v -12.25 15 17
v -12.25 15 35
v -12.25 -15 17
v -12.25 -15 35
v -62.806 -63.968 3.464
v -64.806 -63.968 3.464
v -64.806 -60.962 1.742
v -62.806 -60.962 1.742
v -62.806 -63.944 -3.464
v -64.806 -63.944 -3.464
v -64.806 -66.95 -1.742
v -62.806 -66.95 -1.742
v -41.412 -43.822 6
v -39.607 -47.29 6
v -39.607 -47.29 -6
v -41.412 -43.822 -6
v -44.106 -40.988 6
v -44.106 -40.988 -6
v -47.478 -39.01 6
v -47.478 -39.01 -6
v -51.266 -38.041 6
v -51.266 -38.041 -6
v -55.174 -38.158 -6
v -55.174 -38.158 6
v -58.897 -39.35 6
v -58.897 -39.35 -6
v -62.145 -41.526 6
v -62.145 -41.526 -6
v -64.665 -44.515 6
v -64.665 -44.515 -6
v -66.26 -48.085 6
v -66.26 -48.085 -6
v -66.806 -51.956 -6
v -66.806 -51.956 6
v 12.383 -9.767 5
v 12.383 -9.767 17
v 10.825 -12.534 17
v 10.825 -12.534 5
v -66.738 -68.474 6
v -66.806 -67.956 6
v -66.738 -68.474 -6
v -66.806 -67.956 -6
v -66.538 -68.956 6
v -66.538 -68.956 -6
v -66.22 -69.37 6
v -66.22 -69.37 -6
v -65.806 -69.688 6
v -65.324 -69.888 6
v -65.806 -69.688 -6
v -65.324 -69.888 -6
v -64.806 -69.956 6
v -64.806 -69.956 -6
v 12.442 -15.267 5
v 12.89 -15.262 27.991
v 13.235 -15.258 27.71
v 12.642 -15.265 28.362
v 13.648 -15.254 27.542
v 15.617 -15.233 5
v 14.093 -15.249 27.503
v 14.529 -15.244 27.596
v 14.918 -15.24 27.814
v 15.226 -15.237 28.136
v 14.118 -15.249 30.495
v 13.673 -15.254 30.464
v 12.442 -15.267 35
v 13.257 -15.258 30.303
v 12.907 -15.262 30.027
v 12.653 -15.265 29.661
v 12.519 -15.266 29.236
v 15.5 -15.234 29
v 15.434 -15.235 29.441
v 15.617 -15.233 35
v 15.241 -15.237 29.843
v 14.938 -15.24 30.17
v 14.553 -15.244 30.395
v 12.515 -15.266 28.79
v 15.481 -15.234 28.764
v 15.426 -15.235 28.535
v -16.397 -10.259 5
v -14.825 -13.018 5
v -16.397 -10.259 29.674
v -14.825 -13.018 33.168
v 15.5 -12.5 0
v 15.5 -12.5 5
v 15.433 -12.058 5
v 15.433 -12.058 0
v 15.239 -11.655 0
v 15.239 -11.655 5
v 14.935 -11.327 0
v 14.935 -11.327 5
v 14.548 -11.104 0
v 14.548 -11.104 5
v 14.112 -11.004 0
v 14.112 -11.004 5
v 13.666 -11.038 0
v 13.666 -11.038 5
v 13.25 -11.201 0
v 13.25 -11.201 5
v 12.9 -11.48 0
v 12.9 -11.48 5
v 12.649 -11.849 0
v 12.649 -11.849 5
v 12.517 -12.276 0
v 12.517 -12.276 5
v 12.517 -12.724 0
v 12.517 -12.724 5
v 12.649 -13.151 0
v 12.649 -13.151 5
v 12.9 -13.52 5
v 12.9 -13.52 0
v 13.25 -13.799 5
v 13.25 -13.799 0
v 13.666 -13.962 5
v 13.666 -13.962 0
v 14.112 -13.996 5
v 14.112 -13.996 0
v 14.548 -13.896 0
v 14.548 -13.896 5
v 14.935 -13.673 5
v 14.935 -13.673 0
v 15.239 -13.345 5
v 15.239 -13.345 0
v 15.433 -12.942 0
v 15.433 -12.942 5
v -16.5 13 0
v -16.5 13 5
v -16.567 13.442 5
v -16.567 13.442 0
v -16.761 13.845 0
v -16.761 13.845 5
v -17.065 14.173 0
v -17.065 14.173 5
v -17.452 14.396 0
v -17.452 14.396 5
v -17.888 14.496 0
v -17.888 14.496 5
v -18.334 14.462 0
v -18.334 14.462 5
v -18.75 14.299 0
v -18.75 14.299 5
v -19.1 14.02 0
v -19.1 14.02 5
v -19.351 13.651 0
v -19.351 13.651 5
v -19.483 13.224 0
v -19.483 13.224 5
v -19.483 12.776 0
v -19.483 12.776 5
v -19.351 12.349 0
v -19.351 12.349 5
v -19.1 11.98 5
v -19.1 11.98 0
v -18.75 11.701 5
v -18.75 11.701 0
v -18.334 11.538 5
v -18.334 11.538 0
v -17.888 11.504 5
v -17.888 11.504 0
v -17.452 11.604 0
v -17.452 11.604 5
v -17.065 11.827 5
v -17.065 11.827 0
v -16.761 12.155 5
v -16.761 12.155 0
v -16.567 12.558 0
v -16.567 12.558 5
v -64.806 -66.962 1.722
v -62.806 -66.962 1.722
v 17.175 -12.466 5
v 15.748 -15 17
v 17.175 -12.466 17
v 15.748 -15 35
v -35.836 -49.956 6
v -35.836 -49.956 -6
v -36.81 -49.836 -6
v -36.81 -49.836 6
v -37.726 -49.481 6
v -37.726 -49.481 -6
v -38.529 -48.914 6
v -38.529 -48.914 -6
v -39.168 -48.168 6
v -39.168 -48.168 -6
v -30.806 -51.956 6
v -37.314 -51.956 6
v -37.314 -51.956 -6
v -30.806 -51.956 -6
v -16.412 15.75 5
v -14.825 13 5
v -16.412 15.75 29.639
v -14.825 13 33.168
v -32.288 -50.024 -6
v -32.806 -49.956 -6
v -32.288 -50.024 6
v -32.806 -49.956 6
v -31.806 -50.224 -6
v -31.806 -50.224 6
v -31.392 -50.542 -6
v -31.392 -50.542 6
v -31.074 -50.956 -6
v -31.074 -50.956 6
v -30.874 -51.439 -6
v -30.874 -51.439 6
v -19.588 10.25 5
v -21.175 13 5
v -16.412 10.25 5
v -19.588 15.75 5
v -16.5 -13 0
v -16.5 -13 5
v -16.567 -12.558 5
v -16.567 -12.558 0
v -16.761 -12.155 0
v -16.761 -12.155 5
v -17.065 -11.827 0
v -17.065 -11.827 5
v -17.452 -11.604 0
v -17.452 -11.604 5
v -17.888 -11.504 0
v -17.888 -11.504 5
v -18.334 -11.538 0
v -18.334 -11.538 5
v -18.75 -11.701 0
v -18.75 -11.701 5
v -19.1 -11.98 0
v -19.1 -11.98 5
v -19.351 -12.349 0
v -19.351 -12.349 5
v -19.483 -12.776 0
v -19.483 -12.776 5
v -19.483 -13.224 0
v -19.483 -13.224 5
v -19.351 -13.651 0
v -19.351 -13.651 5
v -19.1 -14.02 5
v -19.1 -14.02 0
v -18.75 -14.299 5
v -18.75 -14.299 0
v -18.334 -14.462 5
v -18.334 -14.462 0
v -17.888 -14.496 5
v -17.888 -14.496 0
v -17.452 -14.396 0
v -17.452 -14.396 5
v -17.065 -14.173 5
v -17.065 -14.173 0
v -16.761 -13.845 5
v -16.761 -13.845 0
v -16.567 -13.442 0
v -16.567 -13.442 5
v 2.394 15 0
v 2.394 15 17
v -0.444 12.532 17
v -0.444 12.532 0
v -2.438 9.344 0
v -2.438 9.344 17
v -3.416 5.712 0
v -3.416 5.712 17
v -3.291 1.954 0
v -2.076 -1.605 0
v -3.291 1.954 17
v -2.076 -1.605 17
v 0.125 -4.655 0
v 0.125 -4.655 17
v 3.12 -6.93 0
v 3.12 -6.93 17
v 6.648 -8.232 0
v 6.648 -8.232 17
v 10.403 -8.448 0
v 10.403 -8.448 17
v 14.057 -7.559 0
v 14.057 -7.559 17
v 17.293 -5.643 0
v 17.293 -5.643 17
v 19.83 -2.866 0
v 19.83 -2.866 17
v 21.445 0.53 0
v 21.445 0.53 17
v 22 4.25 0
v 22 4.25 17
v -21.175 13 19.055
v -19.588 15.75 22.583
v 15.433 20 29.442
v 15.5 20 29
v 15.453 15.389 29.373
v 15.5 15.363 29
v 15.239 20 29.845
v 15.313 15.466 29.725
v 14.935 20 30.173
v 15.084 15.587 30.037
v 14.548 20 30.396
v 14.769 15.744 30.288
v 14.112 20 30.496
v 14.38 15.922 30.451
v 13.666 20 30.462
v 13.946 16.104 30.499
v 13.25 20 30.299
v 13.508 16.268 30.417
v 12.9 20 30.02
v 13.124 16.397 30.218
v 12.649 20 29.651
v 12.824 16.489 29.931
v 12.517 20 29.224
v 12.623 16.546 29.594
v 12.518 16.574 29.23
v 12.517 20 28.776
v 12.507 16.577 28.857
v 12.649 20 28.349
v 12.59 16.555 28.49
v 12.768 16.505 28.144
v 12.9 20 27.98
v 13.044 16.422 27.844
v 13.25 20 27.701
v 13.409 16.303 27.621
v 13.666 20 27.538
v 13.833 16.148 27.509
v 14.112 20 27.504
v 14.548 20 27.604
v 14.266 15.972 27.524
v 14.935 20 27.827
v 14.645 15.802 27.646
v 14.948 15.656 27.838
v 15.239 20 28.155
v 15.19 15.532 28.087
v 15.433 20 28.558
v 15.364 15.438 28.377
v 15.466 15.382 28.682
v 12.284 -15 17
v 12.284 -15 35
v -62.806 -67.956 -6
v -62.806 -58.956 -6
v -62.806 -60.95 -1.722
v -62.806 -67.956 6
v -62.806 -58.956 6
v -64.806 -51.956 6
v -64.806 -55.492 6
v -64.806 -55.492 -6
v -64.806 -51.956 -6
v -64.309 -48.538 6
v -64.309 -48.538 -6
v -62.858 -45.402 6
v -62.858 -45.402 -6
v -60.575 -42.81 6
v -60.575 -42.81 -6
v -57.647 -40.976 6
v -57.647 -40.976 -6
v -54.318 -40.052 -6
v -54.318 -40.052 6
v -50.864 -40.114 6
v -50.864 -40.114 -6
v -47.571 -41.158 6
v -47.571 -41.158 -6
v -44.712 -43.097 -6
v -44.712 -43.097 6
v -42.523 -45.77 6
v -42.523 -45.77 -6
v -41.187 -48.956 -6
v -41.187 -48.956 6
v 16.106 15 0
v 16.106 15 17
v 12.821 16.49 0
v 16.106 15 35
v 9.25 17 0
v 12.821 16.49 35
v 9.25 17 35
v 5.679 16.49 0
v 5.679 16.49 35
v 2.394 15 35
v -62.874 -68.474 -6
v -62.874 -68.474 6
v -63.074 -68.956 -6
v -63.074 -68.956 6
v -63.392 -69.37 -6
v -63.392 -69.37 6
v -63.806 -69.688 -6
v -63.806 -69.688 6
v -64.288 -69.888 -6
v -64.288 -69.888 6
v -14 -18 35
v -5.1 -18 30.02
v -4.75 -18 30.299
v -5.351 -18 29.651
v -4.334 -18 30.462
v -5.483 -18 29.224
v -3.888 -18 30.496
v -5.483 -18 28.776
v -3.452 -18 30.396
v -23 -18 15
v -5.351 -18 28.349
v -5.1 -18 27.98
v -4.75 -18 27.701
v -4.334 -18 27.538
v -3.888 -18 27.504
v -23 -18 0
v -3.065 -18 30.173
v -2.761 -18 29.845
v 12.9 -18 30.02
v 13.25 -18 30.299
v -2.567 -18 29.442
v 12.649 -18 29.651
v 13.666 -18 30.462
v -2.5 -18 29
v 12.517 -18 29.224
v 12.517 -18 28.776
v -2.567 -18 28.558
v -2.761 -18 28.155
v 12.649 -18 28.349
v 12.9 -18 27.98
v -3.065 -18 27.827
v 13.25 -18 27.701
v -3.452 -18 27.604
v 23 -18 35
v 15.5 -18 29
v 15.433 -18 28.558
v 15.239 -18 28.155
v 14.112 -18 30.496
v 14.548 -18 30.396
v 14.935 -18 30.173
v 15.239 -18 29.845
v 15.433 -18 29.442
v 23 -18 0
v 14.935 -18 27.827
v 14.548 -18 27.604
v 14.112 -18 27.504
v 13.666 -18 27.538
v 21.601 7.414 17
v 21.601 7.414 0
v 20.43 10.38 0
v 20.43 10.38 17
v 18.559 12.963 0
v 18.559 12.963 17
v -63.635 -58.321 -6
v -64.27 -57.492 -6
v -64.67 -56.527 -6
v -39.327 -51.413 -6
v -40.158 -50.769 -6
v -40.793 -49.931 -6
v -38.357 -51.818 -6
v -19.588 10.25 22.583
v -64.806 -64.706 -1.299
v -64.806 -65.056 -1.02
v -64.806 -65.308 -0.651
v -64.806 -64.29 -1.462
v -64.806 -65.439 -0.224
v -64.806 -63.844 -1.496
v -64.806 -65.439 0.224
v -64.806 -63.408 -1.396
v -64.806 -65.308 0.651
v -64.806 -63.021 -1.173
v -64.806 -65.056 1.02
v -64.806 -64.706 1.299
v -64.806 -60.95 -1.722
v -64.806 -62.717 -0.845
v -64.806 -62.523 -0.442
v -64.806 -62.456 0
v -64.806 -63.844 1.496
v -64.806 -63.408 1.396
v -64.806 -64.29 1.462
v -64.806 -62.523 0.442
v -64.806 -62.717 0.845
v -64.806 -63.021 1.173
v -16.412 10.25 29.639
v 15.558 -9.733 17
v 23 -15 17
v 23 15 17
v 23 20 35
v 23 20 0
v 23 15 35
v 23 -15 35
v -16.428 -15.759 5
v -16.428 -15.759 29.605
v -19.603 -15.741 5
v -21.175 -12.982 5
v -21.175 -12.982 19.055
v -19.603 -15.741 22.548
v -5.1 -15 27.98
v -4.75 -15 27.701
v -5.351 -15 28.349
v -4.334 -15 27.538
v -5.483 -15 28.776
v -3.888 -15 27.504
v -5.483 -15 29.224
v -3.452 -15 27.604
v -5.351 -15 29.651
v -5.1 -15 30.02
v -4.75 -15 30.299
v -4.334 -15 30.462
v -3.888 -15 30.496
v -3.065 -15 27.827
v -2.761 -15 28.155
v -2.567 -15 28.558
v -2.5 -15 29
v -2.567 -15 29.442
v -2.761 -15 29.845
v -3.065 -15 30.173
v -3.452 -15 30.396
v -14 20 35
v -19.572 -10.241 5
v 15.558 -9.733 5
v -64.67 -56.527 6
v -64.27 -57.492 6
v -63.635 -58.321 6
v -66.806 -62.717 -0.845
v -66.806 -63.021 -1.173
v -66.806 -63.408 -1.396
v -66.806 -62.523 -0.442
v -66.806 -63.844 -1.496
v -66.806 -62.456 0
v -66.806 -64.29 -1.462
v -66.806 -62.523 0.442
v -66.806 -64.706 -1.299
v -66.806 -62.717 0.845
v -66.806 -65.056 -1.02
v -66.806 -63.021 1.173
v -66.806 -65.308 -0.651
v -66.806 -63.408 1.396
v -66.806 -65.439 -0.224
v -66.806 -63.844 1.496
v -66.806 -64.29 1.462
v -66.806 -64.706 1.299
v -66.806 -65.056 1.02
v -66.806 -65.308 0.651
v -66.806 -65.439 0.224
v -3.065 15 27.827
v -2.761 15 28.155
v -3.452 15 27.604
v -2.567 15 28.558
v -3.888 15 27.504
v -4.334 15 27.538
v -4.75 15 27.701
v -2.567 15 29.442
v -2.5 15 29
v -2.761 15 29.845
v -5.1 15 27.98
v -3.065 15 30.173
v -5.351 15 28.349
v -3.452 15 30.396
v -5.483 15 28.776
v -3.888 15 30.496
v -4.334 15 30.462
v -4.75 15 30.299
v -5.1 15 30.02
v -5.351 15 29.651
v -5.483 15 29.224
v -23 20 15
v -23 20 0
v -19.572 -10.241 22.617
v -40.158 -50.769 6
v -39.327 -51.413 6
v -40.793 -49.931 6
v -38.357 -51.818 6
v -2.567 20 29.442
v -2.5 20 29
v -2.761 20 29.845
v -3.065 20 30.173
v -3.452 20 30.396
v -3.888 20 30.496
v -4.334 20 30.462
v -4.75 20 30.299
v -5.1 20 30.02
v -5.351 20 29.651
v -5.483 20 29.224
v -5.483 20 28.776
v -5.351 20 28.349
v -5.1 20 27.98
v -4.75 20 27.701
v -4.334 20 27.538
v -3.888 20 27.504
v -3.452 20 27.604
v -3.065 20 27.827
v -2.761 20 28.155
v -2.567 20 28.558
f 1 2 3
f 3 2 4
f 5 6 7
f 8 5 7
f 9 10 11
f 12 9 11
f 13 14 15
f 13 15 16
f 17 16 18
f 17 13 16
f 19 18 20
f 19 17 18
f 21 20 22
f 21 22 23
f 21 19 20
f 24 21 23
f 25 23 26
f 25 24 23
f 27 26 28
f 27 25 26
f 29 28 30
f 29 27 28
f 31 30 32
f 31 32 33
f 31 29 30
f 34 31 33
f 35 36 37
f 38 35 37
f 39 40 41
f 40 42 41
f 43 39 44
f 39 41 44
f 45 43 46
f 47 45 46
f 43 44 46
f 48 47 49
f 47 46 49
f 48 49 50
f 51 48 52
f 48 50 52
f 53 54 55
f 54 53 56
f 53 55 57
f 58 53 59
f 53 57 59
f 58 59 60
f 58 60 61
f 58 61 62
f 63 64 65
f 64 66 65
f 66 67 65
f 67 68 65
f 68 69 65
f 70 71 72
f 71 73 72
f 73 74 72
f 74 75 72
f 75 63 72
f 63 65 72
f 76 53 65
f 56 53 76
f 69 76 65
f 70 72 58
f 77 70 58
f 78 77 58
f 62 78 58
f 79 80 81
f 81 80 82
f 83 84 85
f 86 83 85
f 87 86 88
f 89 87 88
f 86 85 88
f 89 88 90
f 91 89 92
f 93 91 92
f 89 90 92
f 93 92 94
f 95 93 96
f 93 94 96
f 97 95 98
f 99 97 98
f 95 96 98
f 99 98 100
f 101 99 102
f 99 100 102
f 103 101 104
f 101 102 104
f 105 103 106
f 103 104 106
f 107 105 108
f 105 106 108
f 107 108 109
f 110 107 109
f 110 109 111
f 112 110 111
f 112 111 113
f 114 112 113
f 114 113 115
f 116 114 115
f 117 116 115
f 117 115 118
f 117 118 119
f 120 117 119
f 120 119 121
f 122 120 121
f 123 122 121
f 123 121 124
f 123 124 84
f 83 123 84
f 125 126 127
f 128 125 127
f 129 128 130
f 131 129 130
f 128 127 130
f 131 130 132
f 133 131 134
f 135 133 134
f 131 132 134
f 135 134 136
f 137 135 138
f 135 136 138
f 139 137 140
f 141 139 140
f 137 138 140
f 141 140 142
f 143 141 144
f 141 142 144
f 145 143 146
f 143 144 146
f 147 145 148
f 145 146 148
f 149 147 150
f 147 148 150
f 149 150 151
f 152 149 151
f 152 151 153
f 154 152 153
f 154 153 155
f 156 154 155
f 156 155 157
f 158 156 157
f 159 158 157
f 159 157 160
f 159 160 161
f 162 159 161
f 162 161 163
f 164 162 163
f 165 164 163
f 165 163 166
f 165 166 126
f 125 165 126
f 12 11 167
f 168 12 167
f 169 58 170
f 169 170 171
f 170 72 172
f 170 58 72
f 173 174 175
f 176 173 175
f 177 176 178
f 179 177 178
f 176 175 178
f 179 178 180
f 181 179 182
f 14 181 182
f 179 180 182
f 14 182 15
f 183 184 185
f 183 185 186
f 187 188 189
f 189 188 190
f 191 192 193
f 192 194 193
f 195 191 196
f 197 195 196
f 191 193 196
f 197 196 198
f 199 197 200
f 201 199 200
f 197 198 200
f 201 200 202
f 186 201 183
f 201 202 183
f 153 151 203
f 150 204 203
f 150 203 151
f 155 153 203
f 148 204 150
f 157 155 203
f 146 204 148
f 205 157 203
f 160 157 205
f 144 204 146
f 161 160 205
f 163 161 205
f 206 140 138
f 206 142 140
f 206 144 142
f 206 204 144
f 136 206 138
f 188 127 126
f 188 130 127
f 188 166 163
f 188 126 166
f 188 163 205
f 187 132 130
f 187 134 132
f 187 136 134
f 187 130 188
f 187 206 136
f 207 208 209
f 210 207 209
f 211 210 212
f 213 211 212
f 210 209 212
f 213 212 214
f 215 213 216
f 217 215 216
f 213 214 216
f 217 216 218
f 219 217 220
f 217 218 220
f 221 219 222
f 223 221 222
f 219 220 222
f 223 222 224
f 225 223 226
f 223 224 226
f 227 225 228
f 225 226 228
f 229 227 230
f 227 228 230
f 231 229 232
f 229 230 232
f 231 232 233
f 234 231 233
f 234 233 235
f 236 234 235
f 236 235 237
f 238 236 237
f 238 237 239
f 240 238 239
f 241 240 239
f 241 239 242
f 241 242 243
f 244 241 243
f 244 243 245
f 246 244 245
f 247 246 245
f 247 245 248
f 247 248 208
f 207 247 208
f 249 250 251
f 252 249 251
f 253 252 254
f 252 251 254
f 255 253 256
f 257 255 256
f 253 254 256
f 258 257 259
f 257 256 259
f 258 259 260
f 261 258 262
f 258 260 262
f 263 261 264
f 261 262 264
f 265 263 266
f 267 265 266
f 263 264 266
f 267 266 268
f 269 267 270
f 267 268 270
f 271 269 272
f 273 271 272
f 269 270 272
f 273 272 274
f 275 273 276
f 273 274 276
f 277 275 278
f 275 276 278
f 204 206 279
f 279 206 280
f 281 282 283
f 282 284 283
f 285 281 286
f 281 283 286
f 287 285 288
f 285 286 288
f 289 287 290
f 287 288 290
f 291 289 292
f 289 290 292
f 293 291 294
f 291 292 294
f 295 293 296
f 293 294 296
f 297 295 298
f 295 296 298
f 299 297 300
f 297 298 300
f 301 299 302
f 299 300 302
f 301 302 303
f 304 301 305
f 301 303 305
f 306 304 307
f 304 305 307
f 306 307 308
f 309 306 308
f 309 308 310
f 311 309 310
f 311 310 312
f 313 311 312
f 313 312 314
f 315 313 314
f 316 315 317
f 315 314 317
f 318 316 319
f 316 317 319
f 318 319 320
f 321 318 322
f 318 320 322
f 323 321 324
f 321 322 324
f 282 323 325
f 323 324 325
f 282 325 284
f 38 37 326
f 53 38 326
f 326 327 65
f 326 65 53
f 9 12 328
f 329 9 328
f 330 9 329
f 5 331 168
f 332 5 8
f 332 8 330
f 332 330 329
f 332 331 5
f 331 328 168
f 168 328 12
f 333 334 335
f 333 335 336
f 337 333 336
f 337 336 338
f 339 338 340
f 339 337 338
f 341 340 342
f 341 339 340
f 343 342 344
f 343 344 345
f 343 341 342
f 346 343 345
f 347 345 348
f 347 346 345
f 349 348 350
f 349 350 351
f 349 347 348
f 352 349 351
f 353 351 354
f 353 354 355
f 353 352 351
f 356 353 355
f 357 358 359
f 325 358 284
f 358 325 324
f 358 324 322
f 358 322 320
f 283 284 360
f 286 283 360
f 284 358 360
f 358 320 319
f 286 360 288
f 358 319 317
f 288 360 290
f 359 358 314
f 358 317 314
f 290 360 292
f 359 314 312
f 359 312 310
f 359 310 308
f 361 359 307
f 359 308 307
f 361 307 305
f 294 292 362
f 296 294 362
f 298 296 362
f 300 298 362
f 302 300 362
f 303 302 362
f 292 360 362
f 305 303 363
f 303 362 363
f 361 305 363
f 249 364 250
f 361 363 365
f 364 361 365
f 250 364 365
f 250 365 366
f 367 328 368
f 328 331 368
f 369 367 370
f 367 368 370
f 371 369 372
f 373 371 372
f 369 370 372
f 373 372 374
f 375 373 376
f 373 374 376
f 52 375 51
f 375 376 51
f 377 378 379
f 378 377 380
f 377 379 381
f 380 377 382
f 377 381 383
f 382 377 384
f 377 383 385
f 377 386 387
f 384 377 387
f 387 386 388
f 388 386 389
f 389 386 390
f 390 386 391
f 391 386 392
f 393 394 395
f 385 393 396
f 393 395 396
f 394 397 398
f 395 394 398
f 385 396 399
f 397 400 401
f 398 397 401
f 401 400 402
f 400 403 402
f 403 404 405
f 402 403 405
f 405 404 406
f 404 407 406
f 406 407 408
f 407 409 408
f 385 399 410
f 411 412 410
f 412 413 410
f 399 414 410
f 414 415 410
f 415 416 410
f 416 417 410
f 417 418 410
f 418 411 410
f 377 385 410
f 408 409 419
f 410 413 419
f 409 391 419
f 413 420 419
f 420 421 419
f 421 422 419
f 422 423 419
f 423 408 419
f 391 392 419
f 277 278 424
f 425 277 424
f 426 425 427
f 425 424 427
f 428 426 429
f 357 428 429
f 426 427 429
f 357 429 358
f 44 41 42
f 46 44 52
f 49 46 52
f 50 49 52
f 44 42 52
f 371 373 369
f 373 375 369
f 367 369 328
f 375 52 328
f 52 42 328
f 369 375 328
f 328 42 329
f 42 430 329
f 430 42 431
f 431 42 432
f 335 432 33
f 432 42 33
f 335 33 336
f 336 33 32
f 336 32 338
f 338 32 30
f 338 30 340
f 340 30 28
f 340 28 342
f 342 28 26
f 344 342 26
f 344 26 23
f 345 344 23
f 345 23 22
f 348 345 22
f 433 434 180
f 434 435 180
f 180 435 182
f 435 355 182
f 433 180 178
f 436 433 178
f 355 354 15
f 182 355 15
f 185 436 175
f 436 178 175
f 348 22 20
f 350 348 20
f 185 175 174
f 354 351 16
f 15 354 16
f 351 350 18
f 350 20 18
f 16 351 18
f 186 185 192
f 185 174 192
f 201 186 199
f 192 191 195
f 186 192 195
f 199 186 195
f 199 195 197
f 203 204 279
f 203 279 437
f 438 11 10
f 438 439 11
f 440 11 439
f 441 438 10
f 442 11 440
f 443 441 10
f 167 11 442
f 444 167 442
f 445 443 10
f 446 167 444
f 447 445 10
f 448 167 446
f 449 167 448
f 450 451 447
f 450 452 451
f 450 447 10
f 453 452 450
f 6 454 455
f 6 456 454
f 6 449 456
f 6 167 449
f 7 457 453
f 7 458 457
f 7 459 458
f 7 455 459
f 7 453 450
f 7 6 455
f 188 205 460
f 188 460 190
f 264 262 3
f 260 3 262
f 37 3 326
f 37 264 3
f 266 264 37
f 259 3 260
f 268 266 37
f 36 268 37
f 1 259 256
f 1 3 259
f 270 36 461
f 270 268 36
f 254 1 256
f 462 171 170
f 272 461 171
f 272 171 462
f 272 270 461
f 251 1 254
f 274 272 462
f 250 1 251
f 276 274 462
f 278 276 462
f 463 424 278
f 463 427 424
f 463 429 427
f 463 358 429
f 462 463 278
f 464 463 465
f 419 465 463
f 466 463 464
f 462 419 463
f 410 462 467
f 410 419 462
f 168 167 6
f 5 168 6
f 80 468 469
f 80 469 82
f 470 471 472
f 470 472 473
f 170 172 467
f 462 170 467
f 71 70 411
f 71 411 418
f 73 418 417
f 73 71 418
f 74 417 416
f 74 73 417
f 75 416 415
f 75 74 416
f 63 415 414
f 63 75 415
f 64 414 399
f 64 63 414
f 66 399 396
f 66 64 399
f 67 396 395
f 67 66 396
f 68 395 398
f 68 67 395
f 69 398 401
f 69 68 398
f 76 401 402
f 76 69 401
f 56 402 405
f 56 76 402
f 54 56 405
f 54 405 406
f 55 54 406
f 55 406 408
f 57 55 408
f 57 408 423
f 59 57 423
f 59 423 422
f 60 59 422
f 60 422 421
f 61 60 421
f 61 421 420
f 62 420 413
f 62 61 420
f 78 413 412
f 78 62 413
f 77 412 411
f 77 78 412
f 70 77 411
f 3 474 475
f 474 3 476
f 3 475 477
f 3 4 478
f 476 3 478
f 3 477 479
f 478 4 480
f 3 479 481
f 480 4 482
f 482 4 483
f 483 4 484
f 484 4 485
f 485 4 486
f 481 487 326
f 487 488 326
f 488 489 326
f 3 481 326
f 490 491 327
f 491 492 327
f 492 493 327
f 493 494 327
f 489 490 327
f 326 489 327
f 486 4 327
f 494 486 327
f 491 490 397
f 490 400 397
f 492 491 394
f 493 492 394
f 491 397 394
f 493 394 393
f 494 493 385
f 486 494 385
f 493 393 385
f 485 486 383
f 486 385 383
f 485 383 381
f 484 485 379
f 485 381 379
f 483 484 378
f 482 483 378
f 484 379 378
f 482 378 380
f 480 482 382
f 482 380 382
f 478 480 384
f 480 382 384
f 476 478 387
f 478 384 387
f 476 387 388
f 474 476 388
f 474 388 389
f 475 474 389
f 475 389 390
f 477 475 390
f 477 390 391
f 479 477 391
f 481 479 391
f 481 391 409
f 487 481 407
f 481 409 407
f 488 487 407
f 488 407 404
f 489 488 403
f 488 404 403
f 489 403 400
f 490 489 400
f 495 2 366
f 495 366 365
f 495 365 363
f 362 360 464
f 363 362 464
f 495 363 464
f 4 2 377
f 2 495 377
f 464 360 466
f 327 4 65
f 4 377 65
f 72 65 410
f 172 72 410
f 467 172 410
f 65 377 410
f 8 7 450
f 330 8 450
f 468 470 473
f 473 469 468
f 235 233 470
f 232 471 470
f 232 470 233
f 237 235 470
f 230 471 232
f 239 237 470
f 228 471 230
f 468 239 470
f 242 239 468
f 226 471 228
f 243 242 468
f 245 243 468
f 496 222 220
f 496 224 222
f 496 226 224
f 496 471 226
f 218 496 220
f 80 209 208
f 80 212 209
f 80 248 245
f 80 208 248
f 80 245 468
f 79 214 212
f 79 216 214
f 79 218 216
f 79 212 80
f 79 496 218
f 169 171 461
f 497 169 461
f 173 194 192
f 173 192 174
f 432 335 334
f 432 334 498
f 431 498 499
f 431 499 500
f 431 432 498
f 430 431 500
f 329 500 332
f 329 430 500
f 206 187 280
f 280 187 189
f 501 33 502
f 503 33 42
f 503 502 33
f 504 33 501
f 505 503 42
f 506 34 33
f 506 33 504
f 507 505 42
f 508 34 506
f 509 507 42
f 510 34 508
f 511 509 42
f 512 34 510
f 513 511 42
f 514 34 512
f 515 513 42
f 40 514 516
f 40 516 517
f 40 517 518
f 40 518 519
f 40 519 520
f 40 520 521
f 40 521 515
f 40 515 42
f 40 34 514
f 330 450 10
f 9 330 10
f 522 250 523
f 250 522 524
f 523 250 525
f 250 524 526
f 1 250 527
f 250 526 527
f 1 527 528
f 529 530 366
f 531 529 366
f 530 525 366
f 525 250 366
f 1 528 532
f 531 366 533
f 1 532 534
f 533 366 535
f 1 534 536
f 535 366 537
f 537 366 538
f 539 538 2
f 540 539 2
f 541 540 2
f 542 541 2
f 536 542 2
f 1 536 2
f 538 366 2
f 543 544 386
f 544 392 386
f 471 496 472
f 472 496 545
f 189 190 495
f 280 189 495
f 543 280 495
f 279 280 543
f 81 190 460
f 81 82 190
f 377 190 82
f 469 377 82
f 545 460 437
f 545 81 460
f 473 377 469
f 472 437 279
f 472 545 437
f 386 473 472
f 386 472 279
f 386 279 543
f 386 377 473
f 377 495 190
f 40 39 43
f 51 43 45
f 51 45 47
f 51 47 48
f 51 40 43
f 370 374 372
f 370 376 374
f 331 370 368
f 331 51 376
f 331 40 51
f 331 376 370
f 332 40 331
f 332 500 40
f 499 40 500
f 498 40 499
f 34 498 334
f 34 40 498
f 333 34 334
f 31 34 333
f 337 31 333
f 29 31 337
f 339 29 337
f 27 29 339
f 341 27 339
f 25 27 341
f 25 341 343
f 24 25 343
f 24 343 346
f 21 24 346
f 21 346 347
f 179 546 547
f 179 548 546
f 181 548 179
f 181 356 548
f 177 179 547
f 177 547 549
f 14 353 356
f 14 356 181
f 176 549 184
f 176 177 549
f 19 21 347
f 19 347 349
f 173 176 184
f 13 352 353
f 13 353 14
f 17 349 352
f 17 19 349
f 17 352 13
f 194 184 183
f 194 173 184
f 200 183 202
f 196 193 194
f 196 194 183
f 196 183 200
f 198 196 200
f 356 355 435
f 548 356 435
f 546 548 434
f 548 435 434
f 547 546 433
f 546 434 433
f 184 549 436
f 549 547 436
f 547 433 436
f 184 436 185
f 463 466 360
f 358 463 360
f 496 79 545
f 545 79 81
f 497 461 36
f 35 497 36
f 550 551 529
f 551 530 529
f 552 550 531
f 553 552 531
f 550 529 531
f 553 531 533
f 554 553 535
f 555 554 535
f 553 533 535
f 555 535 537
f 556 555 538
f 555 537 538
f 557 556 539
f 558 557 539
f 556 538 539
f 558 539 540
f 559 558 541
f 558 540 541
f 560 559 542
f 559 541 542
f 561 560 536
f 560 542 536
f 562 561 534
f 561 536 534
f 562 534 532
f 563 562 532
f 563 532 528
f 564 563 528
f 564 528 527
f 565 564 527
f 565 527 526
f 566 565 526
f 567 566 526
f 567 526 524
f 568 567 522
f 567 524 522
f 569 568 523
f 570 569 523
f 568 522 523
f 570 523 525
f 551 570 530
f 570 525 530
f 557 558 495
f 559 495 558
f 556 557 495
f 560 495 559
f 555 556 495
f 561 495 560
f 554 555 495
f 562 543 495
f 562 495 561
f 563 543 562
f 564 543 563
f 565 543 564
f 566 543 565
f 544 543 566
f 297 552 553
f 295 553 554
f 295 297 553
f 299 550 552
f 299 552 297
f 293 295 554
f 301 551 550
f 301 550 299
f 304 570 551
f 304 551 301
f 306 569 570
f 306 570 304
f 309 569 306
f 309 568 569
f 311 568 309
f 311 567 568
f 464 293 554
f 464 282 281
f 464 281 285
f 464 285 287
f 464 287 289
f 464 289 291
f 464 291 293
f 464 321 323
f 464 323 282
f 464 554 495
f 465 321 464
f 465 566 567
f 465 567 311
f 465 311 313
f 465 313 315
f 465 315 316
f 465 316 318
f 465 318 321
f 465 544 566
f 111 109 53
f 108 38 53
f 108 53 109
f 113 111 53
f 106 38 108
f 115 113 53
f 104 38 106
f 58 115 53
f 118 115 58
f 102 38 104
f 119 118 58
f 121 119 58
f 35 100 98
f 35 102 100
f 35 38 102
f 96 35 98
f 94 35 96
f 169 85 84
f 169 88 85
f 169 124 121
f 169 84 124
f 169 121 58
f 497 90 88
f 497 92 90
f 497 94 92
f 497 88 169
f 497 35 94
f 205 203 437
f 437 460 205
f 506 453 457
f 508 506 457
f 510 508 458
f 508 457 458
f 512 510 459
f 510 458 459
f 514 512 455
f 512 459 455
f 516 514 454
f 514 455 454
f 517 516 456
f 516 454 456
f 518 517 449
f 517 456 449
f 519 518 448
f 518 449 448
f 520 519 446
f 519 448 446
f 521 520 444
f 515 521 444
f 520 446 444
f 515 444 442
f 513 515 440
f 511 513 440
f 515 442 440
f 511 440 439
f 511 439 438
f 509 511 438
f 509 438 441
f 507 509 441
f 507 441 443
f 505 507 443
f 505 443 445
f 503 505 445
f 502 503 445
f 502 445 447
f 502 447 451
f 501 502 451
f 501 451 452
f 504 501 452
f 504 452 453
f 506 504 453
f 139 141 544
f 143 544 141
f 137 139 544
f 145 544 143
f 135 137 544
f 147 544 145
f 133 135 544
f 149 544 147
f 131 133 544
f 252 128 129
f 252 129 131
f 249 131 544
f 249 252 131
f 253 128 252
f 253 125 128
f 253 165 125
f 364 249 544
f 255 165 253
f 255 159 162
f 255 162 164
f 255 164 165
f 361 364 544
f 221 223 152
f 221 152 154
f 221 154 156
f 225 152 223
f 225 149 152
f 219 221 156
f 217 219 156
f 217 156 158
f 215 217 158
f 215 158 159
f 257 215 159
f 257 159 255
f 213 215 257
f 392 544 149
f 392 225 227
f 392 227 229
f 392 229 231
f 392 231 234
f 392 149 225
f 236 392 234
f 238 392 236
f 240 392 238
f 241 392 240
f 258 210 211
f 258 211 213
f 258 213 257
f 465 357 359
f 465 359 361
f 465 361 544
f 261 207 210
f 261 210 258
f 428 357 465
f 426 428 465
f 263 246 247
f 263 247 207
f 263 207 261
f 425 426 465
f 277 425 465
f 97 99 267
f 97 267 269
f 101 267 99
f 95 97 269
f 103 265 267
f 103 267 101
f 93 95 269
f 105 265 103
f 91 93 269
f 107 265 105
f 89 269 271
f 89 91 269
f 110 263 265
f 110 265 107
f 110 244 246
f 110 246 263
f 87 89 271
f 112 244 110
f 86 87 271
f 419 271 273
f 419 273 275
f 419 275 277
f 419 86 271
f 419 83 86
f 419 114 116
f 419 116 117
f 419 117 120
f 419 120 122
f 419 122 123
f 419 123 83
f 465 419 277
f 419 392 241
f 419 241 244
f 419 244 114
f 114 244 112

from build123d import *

# Parameters (mm, degrees)
F0_W         = 46
F0_H         = 36
F1_DEPTH     = 35
F2_R         = 1.5
F3_DEPTH     = 50
F4_DEPTH     = 30
F6_DEPTH     = 18
F8_DEPTH     = 25
F9_R         = 1.5
F10_DEPTH    = 50
F11_T1_DEPTH = 139.6606830198
F13_DEPTH    = 6
F14_W        = 11
F14_H        = 12
F15_DEPTH    = 2
F14_R        = 1.5
F16_DEPTH    = 25
F17_T1_DEPTH = 12
F17_T3_DEPTH = 12
F17_T5_DEPTH = 29.4596669241
F18_R        = 1.99999
F19_DEPTH    = 2


# Not quite as in the source:
# - a fillet or chamfer that OpenCascade refuses, or shapes differently, is made with other operations: its cross-section is extruded or revolved along the edge and cut away or added
# - a fillet or chamfer is up to 0.001 mm smaller than in the source, because OpenCascade refuses the exact size
# - a feature names something its author has since deleted; it is built from what else it names


with BuildPart() as f1:
    # F0 (on Top) → F1 (new body)
    with BuildSketch(Plane.XY):
        Rectangle(F0_W, F0_H)
    extrude(amount=F1_DEPTH)

    # F2 (on face) → F3 (cut)
    with BuildSketch(Plane.XY.offset(35)):
        with Locations((-18, 13)):
            Circle(F2_R)
        with Locations((-18, -13)):
            Circle(F2_R)
        with Locations((14, -12.5)):
            Circle(F2_R)
    extrude(amount=-F3_DEPTH, mode=Mode.SUBTRACT)

    # F2 (on face) → F4 (cut)
    with BuildSketch(Plane.XY.offset(35)):
        Polygon((10.8247584463, -12.5342696548), (12.4420576148, -15.266974676), (15.6172991685, -15.2327050212), (17.1752415537, -12.4657303452), (15.5579423852, -9.733025324), (12.3827008315, -9.7672949788), align=None)
        with Locations((14, -12.5)):
            Circle(F2_R, mode=Mode.SUBTRACT)
        Polygon((-14.8246241, -13.01792281), (-16.3967904413, -10.259005209), (-19.5721663413, -10.2410823991), (-21.1753759, -12.98207719), (-19.6032095587, -15.740994791), (-16.4278336587, -15.7589176009), align=None)
        with Locations((-18, -13)):
            Circle(F2_R, mode=Mode.SUBTRACT)
        Polygon((-19.5877132403, 15.75), (-21.1754264805, 13), (-19.5877132403, 10.25), (-16.4122867597, 10.25), (-14.8245735195, 13), (-16.4122867597, 15.75), align=None)
        with Locations((-18, 13)):
            Circle(F2_R, mode=Mode.SUBTRACT)
    extrude(amount=-F4_DEPTH, mode=Mode.SUBTRACT)

    # F5 (on face) → F6 (cut)
    with BuildSketch(Plane.XY.offset(35)):
        Polygon((15.7483235031, -15), (23, -15), (23, 15), (-12.25, 15), (-12.25, -15), (12.2840537621, -15), (10.8247584463, -12.5342696548), (12.3827008315, -9.7672949788), (15.5579423852, -9.733025324), (17.1752415537, -12.4657303452), align=None)
    extrude(amount=-F6_DEPTH, mode=Mode.SUBTRACT)

    # F7 (on face) → F8 (cut, symmetric)
    with BuildSketch(Plane.XY.offset(17)):
        with BuildLine():
            Line((2.3943453996, 15), (16.1056546004, 15))
            ThreePointArc((16.1056546004, 15), (9.25, 17), (2.3943453996, 15))
        make_face()
        with BuildLine():
            ThreePointArc((2.3943453996, 15), (3.120036548, -6.9297159211), (22, 4.25))
            ThreePointArc((22, 4.25), (20.4297159211, 10.379963452), (16.1056546004, 15))
            Line((16.1056546004, 15), (2.3943453996, 15))
        make_face()
    extrude(amount=F8_DEPTH, both=True, mode=Mode.SUBTRACT)

    # F9 (on face) → F10 (cut, symmetric)
    with BuildSketch(Plane.XZ.offset(-15)):
        with Locations((14, 29)):
            Circle(F9_R)
        with Locations((-4, 29)):
            Circle(F9_R)
    extrude(amount=F10_DEPTH, both=True, mode=Mode.SUBTRACT)

    # F11: chamfer of 9 x 20 on 1 edges, made by hand

    # F11_s2 → F11_t1 (cut)
    with BuildSketch(Plane.XZ.offset(-69.8303415099)):
        Polygon((-14, 35), (-23, 15), (-23, 35), align=None)
    extrude(amount=F11_T1_DEPTH, mode=Mode.SUBTRACT)

    # F19 (add): a face of the model
    f19_faces = [f1.faces().sort_by_distance(p)[0] for p in [
        (1.1483875738, 18, 16.7445677024),
    ]]
    extrude(f19_faces, amount=F19_DEPTH)


with BuildPart() as f13:
    # F12 (on Top) → F13 (new body, symmetric)
    with BuildSketch(Plane.XY):
        with BuildLine():
            ThreePointArc((-64.8061240633, -51.9561834335), (-52.8061240633, -39.9561834335), (-40.8061240633, -51.9561834335))
            Line((-40.8061240633, -51.9561834335), (-40.8061240633, -49.9561834335))
            Line((-40.8061240633, -49.9561834335), (-38.9497176027, -49.9561834335))
            ThreePointArc((-38.9497176027, -49.9561834335), (-53.8086981384, -37.9921279616), (-66.8061240633, -51.9561834335))
            Line((-66.8061240633, -51.9561834335), (-64.8061240633, -51.9561834335))
        make_face()
        with BuildLine():
            ThreePointArc((-38.9497176027, -49.9561834335), (-38.8420685913, -50.9536093584), (-38.8061240633, -51.9561834335))
            Line((-38.8061240633, -51.9561834335), (-30.8061240633, -51.9561834335))
            Line((-30.8061240633, -51.9561834335), (-30.8061240633, -49.9561834335))
            Line((-30.8061240633, -49.9561834335), (-38.9497176027, -49.9561834335))
        make_face()
        with BuildLine():
            Line((-40.8061240633, -49.9561834335), (-40.8061240633, -51.9561834335))
            Line((-40.8061240633, -51.9561834335), (-38.8061240633, -51.9561834335))
            ThreePointArc((-38.8061240633, -51.9561834335), (-38.8420685913, -50.9536093584), (-38.9497176027, -49.9561834335))
            Line((-38.9497176027, -49.9561834335), (-40.8061240633, -49.9561834335))
        make_face()
        with BuildLine():
            Line((-64.8061240633, -59.1672859845), (-64.8061240633, -51.9561834335))
            Line((-64.8061240633, -51.9561834335), (-66.8061240633, -51.9561834335))
            ThreePointArc((-66.8061240633, -51.9561834335), (-66.2968616265, -55.6978408203), (-64.8061240633, -59.1672859845))
        make_face()
        with BuildLine():
            ThreePointArc((-64.8061240633, -59.1672859845), (-66.2968616265, -55.6978408203), (-66.8061240633, -51.9561834335))
            Line((-66.8061240633, -51.9561834335), (-66.8061240633, -69.9561834335))
            Line((-66.8061240633, -69.9561834335), (-64.8061240633, -69.9561834335))
            Line((-64.8061240633, -69.9561834335), (-64.8061240633, -59.1672859845))
        make_face()
    extrude(amount=F13_DEPTH, both=True)

    # F14 (on face) → F15 (join)
    with BuildSketch(Plane.YZ.offset(-64.8061240633)):
        with Locations((-64.4561834335, 0)):
            Rectangle(F14_W, F14_H)
        Polygon((-60.9620828312, 1.742268864), (-60.9502840359, -1.7218327511), (-63.9443846382, -3.4641016151), (-66.9502840359, -1.742268864), (-66.9620828312, 1.7218327511), (-63.9679822288, 3.4641016151), align=None, mode=Mode.SUBTRACT)
    extrude(amount=F15_DEPTH)

    # F14 (on face) → F16 (cut)
    with BuildSketch(Plane.YZ.offset(-64.8061240633)):
        with Locations((-63.9561834335, 0)):
            Circle(F14_R)
    extrude(amount=-F16_DEPTH, mode=Mode.SUBTRACT)

    # F17: fillet of radius 4 on 3 edges, made by hand

    # F17_s2 → F17_t1 (join)
    with BuildSketch(Plane.XY.offset(-6)):
        with BuildLine():
            ThreePointArc((-64.8061240633, -55.4920818184), (-64.2702256784, -57.4920818184), (-62.8061240633, -58.9561834335))
            Line((-62.8061240633, -58.9561834335), (-64.8061240633, -58.9561834335))
            Line((-64.8061240633, -58.9561834335), (-64.8061240633, -55.4920818184))
        make_face()
    extrude(amount=F17_T1_DEPTH)

    # F17_s4 → F17_t3 (join)
    with BuildSketch(Plane.XY.offset(-6)):
        with BuildLine():
            ThreePointArc((-35.8355613148, -49.9561834335), (-38.1449623915, -49.2221697572), (-39.6067974811, -47.2895167669))
            ThreePointArc((-39.6067974811, -47.2895167669), (-39.2127083631, -48.6066984578), (-38.9497176027, -49.9561834335))
            Line((-38.9497176027, -49.9561834335), (-35.8355613148, -49.9561834335))
        make_face()
    extrude(amount=F17_T3_DEPTH)

    # F17_s6 → F17_t5 (cut)
    with BuildSketch(Plane.XY.offset(-14.7298334621)):
        with BuildLine():
            ThreePointArc((-41.1871740246, -48.9561834335), (-39.7636804212, -51.1184610937), (-37.3141906784, -51.9561834335))
            Line((-37.3141906784, -51.9561834335), (-40.8061240633, -51.9561834335))
            ThreePointArc((-40.8061240633, -51.9561834335), (-40.9017677081, -50.4441319237), (-41.1871740246, -48.9561834335))
        make_face()
    extrude(amount=F17_T5_DEPTH, mode=Mode.SUBTRACT)

    # F18 (radius 2 in the source; OpenCascade refuses exactly that, so slightly less here)
    f18_edges = [f13.edges().sort_by_distance(p)[0] for p in [
        (-66.806124, -69.956183, 0),
        (-62.806124, -69.956183, 0),
        (-30.806124, -49.956183, 0),
    ]]
    fillet(f18_edges, radius=F18_R)


solid = Compound([f1.part, f13.part])
